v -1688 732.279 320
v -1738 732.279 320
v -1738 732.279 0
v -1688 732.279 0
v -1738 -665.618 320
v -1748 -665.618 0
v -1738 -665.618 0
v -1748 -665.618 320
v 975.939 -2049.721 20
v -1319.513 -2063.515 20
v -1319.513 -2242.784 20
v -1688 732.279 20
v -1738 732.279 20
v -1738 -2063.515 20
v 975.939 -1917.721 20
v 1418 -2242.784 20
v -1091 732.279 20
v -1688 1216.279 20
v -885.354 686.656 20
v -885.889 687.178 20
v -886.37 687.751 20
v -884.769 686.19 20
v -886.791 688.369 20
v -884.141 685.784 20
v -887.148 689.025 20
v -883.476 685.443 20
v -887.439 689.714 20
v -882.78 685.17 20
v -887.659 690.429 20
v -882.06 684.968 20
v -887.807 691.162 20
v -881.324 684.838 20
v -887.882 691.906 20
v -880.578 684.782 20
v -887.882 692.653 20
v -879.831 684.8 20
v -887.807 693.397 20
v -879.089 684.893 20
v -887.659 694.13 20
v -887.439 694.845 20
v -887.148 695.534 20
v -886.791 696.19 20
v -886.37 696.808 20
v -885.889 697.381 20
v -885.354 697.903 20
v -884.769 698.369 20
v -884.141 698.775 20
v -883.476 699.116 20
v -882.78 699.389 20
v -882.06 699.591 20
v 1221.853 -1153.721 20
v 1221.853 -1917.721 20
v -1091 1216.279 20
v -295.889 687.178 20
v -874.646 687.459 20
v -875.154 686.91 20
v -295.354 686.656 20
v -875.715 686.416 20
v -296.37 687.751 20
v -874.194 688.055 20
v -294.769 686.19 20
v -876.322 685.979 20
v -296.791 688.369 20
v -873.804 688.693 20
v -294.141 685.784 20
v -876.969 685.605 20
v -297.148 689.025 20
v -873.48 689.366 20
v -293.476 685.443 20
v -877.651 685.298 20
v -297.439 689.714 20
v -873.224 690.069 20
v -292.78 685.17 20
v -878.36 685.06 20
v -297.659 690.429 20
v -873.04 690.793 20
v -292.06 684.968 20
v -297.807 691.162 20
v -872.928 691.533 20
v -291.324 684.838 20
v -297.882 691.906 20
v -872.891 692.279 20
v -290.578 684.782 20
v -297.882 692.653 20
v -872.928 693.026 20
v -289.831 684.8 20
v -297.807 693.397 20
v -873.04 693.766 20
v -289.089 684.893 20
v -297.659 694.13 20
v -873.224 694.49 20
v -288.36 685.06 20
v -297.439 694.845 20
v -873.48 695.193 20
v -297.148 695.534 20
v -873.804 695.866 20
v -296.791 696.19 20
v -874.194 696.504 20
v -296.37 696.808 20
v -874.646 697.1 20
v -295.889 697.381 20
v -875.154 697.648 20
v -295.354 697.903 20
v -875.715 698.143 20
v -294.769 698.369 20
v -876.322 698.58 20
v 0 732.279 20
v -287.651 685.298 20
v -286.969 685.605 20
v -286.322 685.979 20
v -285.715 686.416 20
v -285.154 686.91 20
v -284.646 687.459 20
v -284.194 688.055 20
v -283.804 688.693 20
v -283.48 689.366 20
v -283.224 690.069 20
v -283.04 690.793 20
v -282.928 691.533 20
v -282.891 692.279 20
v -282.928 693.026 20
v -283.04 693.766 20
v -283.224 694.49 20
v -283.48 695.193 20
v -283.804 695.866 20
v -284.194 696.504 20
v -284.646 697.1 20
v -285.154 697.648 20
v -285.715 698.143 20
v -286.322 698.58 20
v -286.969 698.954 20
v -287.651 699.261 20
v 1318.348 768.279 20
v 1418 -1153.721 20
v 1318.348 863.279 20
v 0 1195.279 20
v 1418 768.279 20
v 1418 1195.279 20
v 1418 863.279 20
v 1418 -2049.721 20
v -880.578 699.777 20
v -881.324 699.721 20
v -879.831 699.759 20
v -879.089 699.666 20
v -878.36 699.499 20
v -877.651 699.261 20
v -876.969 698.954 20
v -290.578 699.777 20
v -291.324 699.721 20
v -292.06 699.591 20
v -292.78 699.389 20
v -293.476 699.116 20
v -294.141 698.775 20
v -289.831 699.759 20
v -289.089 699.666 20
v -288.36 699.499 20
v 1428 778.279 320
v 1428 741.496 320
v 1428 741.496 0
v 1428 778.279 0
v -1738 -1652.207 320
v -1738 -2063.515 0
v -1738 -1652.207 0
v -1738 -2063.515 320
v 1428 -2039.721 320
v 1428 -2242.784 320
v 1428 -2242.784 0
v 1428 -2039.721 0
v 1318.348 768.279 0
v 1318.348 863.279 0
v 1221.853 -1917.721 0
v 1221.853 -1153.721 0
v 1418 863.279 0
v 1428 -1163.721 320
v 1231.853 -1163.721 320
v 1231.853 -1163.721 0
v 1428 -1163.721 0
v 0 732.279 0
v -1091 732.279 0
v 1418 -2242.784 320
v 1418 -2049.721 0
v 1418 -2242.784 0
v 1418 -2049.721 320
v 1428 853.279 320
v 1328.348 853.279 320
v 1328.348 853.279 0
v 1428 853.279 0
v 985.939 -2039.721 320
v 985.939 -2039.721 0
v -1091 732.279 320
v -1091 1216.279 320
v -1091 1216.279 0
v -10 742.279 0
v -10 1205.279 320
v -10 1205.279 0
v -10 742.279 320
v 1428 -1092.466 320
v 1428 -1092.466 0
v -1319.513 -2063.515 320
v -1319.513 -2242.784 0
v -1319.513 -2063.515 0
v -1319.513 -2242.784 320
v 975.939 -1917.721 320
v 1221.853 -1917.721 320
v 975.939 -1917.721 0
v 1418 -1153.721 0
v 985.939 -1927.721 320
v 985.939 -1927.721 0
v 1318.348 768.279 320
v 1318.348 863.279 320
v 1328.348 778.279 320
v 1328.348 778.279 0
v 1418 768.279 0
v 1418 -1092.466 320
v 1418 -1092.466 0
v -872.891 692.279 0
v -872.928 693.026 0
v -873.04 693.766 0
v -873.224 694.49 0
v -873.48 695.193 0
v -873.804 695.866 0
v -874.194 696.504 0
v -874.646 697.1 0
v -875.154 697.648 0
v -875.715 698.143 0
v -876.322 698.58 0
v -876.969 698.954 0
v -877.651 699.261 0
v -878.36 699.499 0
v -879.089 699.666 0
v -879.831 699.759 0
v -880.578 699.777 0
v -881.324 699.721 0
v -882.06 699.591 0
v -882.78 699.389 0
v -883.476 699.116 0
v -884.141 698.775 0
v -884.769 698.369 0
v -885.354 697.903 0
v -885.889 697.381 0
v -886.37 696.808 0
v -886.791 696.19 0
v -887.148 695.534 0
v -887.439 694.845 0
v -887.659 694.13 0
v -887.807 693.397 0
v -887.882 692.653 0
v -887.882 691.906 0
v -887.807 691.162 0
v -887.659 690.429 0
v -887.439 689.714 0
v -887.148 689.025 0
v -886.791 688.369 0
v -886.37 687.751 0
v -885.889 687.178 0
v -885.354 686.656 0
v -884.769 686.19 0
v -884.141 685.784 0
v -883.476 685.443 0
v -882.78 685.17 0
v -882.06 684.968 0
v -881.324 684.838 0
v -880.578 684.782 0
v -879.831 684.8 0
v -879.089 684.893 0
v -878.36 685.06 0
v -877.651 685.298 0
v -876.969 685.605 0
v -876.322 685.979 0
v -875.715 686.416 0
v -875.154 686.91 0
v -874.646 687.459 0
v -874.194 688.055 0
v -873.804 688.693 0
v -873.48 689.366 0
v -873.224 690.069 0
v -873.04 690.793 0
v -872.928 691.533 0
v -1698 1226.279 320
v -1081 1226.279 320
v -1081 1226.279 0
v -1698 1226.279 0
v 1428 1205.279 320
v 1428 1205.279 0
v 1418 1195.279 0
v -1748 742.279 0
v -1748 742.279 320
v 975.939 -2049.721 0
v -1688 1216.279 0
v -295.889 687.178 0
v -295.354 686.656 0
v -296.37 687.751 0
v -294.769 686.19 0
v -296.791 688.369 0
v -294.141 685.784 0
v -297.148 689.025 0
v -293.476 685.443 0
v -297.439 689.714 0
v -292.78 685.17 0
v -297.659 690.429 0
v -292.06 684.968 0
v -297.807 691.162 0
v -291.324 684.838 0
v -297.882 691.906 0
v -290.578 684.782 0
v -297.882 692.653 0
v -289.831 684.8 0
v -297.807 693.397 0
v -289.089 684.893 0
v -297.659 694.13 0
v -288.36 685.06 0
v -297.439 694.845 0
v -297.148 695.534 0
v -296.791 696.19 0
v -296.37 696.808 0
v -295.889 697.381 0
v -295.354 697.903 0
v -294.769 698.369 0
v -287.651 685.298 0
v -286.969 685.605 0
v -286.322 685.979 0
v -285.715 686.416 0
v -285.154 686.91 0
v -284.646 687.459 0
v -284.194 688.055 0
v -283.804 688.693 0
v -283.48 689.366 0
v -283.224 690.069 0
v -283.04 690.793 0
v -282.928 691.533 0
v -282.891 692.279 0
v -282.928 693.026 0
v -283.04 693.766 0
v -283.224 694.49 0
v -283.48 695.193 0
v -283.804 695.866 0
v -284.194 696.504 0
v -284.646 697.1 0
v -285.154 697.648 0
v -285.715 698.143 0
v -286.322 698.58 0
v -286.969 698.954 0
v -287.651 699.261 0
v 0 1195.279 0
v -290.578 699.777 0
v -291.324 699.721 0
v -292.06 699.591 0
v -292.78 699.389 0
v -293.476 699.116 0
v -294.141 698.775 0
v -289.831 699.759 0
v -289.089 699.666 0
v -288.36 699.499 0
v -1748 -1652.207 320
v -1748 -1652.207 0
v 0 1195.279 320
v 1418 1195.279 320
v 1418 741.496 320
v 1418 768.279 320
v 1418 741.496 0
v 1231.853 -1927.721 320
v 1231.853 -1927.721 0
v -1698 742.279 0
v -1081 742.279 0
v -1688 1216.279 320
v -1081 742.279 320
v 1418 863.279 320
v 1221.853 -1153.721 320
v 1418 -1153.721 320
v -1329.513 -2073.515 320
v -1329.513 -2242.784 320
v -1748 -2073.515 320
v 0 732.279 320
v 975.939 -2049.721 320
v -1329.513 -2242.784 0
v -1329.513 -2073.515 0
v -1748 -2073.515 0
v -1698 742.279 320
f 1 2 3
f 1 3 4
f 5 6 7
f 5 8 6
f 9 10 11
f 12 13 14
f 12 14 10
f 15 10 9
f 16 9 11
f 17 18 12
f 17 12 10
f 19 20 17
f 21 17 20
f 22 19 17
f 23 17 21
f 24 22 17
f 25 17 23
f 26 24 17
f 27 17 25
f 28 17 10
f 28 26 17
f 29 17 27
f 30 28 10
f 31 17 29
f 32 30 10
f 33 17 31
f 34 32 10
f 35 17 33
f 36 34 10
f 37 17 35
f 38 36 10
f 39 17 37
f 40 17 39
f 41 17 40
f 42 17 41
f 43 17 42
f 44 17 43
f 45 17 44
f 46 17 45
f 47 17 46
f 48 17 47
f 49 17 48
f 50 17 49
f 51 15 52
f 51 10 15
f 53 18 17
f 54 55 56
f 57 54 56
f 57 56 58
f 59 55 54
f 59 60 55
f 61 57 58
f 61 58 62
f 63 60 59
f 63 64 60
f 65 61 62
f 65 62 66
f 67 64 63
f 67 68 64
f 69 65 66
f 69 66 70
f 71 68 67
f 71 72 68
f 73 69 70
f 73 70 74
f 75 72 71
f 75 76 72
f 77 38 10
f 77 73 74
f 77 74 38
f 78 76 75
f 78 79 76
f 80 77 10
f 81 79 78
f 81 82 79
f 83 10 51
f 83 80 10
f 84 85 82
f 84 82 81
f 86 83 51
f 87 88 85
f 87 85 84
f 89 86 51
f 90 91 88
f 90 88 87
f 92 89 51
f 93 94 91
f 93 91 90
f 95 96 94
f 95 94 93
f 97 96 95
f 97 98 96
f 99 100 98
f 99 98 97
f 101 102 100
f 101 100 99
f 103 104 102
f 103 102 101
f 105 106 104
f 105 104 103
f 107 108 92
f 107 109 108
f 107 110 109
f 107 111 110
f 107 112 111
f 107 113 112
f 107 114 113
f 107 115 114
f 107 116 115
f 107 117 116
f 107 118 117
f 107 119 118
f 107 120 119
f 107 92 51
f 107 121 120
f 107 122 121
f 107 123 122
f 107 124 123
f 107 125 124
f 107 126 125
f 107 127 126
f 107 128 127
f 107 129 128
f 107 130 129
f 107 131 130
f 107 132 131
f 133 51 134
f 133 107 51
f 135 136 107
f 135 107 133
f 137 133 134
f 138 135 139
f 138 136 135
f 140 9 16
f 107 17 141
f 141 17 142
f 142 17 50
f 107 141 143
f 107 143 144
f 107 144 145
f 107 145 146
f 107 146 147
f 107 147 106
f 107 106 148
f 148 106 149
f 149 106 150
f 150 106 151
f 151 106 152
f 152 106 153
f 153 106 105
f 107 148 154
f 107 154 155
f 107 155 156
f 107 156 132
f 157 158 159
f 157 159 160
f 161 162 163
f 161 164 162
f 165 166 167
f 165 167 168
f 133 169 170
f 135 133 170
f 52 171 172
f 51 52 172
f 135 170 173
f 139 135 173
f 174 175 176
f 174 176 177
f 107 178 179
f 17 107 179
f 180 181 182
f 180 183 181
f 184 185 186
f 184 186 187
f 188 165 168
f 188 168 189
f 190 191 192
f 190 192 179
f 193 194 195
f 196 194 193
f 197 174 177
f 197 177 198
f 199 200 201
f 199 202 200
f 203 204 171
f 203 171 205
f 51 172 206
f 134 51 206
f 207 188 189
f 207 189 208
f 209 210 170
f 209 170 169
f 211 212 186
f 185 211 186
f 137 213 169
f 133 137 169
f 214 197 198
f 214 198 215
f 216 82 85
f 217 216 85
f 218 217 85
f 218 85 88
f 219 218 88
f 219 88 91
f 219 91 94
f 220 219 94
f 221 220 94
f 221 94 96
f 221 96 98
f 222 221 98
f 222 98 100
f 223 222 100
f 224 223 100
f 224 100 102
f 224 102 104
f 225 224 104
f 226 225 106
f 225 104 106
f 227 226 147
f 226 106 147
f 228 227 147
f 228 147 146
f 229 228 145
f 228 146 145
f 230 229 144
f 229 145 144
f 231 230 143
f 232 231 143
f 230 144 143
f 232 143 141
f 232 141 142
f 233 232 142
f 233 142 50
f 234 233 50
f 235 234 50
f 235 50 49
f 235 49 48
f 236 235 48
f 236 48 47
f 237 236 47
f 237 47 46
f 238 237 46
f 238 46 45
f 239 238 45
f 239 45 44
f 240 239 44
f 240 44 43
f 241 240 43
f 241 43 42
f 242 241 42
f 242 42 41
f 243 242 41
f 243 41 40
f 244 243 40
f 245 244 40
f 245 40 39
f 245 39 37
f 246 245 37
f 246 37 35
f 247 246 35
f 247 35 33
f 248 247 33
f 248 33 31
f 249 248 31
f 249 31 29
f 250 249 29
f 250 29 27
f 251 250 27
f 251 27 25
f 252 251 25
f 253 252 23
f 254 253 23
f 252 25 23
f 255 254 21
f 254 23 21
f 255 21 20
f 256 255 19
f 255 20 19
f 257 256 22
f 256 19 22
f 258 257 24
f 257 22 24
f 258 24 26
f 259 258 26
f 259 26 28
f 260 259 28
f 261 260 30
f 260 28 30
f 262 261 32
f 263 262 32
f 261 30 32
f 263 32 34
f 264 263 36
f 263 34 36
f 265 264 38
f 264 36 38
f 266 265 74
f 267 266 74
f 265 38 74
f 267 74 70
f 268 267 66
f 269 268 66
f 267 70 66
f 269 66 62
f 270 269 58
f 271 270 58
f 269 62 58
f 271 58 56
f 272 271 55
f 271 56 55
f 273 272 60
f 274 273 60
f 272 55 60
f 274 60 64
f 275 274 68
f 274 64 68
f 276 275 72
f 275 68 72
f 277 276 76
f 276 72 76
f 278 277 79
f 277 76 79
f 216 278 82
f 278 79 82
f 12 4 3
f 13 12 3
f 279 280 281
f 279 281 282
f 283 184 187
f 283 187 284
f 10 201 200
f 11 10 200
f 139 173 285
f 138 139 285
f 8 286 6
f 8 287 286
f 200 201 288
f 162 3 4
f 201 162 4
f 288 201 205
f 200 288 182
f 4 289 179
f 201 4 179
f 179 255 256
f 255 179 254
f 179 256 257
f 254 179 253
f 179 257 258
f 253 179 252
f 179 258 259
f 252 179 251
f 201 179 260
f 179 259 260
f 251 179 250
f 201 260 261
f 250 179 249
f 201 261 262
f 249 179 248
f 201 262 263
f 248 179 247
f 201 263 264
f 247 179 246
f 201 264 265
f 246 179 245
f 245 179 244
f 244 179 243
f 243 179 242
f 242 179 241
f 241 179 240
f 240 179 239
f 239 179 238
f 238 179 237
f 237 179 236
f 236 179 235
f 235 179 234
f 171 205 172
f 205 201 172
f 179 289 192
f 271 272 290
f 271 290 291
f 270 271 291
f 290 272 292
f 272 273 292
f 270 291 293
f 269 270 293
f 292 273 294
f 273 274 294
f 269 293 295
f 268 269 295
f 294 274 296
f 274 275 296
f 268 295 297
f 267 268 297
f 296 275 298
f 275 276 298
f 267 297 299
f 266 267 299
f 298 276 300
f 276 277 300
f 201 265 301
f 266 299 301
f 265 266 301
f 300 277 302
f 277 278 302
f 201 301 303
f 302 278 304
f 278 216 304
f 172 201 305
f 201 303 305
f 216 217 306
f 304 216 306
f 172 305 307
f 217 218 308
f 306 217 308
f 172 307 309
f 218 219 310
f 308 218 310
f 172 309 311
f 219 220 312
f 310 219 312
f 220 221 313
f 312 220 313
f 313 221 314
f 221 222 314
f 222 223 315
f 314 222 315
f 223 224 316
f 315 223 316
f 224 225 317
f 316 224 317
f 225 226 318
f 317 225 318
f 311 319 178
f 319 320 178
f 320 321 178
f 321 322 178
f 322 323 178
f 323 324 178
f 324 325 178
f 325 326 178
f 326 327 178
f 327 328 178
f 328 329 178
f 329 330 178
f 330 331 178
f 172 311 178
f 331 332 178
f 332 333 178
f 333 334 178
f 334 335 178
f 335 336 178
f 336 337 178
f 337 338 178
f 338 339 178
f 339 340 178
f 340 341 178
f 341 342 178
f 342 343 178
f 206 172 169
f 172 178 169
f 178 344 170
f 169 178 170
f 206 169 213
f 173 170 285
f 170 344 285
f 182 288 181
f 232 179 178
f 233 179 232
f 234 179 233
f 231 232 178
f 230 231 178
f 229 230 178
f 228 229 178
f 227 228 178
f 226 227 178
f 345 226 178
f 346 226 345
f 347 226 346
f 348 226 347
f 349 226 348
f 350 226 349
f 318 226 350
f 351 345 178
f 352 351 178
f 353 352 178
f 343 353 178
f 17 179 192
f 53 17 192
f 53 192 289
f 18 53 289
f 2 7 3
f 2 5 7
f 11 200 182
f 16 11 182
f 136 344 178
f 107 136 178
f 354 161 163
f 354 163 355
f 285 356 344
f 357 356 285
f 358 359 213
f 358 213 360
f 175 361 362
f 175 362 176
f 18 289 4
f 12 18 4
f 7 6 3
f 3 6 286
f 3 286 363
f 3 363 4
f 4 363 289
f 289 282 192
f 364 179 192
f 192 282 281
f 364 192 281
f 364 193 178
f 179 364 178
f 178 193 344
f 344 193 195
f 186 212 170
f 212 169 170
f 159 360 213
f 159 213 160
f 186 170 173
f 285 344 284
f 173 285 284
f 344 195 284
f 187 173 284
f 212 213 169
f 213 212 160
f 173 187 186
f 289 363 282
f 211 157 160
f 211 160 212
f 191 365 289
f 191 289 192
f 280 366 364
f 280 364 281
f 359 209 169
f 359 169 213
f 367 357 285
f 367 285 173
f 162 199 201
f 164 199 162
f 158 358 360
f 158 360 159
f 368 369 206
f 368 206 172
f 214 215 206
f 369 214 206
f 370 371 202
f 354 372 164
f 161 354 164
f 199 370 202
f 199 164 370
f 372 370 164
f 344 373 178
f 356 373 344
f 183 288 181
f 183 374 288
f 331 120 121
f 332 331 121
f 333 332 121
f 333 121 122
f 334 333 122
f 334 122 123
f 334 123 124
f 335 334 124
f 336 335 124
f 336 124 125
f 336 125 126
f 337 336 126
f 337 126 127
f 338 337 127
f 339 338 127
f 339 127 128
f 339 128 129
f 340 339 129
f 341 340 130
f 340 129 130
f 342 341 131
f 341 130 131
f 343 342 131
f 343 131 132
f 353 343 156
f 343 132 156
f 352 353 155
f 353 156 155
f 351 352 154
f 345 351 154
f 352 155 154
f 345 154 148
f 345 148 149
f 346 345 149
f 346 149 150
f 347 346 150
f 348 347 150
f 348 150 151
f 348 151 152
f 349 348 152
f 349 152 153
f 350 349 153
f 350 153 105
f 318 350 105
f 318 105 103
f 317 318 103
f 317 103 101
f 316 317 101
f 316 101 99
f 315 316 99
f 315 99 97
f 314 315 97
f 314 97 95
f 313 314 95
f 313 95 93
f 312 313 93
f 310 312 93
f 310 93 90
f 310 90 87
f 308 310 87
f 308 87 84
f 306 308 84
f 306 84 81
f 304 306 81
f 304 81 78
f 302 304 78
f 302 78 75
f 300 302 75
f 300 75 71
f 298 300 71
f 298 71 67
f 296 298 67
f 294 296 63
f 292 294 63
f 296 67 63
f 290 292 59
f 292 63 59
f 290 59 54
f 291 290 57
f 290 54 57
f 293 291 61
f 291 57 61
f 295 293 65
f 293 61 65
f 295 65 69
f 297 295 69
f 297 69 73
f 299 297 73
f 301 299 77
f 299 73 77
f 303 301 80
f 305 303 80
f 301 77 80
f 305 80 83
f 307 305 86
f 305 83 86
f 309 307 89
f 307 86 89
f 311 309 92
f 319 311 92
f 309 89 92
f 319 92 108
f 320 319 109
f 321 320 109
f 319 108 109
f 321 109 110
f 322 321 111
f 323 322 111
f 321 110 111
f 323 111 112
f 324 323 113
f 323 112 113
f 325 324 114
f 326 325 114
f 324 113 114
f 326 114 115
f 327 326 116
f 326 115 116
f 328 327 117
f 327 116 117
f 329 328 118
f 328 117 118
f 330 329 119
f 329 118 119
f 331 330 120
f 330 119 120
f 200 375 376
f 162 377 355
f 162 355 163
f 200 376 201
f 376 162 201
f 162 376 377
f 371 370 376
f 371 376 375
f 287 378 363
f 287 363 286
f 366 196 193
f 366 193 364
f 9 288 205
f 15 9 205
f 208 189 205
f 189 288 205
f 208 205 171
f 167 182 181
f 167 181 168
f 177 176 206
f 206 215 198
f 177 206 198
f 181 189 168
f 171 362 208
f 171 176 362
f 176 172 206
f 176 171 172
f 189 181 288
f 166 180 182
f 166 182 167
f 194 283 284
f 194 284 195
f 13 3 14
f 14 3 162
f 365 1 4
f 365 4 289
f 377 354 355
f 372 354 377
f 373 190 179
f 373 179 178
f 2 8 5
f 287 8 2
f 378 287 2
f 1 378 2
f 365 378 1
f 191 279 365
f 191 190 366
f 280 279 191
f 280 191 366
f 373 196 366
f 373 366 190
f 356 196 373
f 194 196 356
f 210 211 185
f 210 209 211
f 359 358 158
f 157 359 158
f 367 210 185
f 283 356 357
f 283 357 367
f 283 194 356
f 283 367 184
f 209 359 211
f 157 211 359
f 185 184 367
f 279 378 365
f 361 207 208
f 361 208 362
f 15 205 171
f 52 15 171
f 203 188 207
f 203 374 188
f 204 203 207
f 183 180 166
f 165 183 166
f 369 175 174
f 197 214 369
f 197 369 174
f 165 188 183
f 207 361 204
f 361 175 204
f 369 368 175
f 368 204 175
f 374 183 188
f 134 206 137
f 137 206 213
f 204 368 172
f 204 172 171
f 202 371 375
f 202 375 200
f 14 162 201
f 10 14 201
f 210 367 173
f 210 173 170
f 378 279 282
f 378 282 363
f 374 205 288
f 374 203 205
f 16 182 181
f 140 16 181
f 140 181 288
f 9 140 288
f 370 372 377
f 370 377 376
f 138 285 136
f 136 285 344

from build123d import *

# Parameters (mm, degrees)
F1_DEPTH      = 20
F3_DEPTH      = 300
F3_DEPTH_BACK = 20
F4_R          = 7.5
F5_DEPTH      = 25


with BuildPart() as f1:
    # F0 (on Top) → F1 (new body)
    with BuildSketch(Plane.XY):
        Polygon((-1091, 1216.2794832001), (-1688, 1216.2794832001), (-1688, 732.2794832001), (-1738, 732.2794832001), (-1738, -728.7205167999), (-1738, -2063.5149478912), (-1319.513422966, -2063.5149478912), (-1319.513422966, -2242.7836989618), (1418, -2242.7836989618), (1418, -2049.7205167999), (975.9391716612, -2049.7205167999), (975.9391716612, -1917.7205167999), (1221.8529838713, -1917.7205167999), (1221.8529838713, -1153.7205167999), (1418, -1153.7205167999), (1418, 662.2794832001), (1418, 768.2794832001), (1318.3475743792, 768.2794832001), (1318.3475743792, 863.2794832001), (1418, 863.2794832001), (1418, 1195.2794832001), (0, 1195.2794832001), (0, 732.2794832001), (-1091, 732.2794832001), align=None)
    extrude(amount=F1_DEPTH)

    # F4 (on face) → F5 (cut)
    with BuildSketch(Plane.XY.offset(20)):
        with Locations((-880.3910539482, 692.2794832001)):
            Circle(F4_R)
        with Locations((-290.3910539482, 692.2794832001)):
            Circle(F4_R)
    extrude(amount=-F5_DEPTH, mode=Mode.SUBTRACT)


with BuildPart() as f3:
    # F2 (on face) → F3 (new body, two sides)
    with BuildSketch(Plane.XY.offset(20)) as f3_sk:
        Polygon((-1738, -2063.5149478912), (-1738, -1652.2065401077), (-1748, -1652.2065401077), (-1748, -2073.5149478912), (-1329.513422966, -2073.5149478912), (-1329.513422966, -2242.7836989618), (-1319.513422966, -2242.7836989618), (-1319.513422966, -2063.5149478912), align=None)
    extrude(amount=F3_DEPTH)
    extrude(f3_sk.sketch, amount=-F3_DEPTH_BACK)


with BuildPart() as f3b:
    # F2 (on face) → F3, piece 2 (new body, two sides)
    with BuildSketch(Plane.XY.offset(20)) as f3_2_sk:
        Polygon((-1738, -665.6177323455), (-1738, 732.2794832001), (-1688, 732.2794832001), (-1688, 1216.2794832001), (-1091, 1216.2794832001), (-1091, 732.2794832001), (0, 732.2794832001), (0, 1195.2794832001), (1418, 1195.2794832001), (1418, 863.2794832001), (1318.3475743792, 863.2794832001), (1318.3475743792, 768.2794832001), (1418, 768.2794832001), (1418, 741.4960861206), (1428, 741.4960861206), (1428, 778.2794832001), (1328.3475743792, 778.2794832001), (1328.3475743792, 853.2794832001), (1428, 853.2794832001), (1428, 1205.2794832001), (-10, 1205.2794832001), (-10, 742.2794832001), (-1081, 742.2794832001), (-1081, 1226.2794832001), (-1698, 1226.2794832001), (-1698, 742.2794832001), (-1748, 742.2794832001), (-1748, -665.6177323455), align=None)
    extrude(amount=F3_DEPTH)
    extrude(f3_2_sk.sketch, amount=-F3_DEPTH_BACK)


with BuildPart() as f3c:
    # F2 (on face) → F3, piece 3 (new body, two sides)
    with BuildSketch(Plane.XY.offset(20)) as f3_3_sk:
        Polygon((1418, -2049.7205167999), (1418, -2242.7836989618), (1428, -2242.7836989618), (1428, -2039.7205167999), (985.9391716612, -2039.7205167999), (985.9391716612, -1927.7205167999), (1231.8529838713, -1927.7205167999), (1231.8529838713, -1163.7205167999), (1428, -1163.7205167999), (1428, -1092.465877533), (1418, -1092.465877533), (1418, -1153.7205167999), (1221.8529838713, -1153.7205167999), (1221.8529838713, -1917.7205167999), (975.9391716612, -1917.7205167999), (975.9391716612, -2049.7205167999), align=None)
    extrude(amount=F3_DEPTH)
    extrude(f3_3_sk.sketch, amount=-F3_DEPTH_BACK)


solid = Compound([f1.part, f3.part, f3b.part, f3c.part])
